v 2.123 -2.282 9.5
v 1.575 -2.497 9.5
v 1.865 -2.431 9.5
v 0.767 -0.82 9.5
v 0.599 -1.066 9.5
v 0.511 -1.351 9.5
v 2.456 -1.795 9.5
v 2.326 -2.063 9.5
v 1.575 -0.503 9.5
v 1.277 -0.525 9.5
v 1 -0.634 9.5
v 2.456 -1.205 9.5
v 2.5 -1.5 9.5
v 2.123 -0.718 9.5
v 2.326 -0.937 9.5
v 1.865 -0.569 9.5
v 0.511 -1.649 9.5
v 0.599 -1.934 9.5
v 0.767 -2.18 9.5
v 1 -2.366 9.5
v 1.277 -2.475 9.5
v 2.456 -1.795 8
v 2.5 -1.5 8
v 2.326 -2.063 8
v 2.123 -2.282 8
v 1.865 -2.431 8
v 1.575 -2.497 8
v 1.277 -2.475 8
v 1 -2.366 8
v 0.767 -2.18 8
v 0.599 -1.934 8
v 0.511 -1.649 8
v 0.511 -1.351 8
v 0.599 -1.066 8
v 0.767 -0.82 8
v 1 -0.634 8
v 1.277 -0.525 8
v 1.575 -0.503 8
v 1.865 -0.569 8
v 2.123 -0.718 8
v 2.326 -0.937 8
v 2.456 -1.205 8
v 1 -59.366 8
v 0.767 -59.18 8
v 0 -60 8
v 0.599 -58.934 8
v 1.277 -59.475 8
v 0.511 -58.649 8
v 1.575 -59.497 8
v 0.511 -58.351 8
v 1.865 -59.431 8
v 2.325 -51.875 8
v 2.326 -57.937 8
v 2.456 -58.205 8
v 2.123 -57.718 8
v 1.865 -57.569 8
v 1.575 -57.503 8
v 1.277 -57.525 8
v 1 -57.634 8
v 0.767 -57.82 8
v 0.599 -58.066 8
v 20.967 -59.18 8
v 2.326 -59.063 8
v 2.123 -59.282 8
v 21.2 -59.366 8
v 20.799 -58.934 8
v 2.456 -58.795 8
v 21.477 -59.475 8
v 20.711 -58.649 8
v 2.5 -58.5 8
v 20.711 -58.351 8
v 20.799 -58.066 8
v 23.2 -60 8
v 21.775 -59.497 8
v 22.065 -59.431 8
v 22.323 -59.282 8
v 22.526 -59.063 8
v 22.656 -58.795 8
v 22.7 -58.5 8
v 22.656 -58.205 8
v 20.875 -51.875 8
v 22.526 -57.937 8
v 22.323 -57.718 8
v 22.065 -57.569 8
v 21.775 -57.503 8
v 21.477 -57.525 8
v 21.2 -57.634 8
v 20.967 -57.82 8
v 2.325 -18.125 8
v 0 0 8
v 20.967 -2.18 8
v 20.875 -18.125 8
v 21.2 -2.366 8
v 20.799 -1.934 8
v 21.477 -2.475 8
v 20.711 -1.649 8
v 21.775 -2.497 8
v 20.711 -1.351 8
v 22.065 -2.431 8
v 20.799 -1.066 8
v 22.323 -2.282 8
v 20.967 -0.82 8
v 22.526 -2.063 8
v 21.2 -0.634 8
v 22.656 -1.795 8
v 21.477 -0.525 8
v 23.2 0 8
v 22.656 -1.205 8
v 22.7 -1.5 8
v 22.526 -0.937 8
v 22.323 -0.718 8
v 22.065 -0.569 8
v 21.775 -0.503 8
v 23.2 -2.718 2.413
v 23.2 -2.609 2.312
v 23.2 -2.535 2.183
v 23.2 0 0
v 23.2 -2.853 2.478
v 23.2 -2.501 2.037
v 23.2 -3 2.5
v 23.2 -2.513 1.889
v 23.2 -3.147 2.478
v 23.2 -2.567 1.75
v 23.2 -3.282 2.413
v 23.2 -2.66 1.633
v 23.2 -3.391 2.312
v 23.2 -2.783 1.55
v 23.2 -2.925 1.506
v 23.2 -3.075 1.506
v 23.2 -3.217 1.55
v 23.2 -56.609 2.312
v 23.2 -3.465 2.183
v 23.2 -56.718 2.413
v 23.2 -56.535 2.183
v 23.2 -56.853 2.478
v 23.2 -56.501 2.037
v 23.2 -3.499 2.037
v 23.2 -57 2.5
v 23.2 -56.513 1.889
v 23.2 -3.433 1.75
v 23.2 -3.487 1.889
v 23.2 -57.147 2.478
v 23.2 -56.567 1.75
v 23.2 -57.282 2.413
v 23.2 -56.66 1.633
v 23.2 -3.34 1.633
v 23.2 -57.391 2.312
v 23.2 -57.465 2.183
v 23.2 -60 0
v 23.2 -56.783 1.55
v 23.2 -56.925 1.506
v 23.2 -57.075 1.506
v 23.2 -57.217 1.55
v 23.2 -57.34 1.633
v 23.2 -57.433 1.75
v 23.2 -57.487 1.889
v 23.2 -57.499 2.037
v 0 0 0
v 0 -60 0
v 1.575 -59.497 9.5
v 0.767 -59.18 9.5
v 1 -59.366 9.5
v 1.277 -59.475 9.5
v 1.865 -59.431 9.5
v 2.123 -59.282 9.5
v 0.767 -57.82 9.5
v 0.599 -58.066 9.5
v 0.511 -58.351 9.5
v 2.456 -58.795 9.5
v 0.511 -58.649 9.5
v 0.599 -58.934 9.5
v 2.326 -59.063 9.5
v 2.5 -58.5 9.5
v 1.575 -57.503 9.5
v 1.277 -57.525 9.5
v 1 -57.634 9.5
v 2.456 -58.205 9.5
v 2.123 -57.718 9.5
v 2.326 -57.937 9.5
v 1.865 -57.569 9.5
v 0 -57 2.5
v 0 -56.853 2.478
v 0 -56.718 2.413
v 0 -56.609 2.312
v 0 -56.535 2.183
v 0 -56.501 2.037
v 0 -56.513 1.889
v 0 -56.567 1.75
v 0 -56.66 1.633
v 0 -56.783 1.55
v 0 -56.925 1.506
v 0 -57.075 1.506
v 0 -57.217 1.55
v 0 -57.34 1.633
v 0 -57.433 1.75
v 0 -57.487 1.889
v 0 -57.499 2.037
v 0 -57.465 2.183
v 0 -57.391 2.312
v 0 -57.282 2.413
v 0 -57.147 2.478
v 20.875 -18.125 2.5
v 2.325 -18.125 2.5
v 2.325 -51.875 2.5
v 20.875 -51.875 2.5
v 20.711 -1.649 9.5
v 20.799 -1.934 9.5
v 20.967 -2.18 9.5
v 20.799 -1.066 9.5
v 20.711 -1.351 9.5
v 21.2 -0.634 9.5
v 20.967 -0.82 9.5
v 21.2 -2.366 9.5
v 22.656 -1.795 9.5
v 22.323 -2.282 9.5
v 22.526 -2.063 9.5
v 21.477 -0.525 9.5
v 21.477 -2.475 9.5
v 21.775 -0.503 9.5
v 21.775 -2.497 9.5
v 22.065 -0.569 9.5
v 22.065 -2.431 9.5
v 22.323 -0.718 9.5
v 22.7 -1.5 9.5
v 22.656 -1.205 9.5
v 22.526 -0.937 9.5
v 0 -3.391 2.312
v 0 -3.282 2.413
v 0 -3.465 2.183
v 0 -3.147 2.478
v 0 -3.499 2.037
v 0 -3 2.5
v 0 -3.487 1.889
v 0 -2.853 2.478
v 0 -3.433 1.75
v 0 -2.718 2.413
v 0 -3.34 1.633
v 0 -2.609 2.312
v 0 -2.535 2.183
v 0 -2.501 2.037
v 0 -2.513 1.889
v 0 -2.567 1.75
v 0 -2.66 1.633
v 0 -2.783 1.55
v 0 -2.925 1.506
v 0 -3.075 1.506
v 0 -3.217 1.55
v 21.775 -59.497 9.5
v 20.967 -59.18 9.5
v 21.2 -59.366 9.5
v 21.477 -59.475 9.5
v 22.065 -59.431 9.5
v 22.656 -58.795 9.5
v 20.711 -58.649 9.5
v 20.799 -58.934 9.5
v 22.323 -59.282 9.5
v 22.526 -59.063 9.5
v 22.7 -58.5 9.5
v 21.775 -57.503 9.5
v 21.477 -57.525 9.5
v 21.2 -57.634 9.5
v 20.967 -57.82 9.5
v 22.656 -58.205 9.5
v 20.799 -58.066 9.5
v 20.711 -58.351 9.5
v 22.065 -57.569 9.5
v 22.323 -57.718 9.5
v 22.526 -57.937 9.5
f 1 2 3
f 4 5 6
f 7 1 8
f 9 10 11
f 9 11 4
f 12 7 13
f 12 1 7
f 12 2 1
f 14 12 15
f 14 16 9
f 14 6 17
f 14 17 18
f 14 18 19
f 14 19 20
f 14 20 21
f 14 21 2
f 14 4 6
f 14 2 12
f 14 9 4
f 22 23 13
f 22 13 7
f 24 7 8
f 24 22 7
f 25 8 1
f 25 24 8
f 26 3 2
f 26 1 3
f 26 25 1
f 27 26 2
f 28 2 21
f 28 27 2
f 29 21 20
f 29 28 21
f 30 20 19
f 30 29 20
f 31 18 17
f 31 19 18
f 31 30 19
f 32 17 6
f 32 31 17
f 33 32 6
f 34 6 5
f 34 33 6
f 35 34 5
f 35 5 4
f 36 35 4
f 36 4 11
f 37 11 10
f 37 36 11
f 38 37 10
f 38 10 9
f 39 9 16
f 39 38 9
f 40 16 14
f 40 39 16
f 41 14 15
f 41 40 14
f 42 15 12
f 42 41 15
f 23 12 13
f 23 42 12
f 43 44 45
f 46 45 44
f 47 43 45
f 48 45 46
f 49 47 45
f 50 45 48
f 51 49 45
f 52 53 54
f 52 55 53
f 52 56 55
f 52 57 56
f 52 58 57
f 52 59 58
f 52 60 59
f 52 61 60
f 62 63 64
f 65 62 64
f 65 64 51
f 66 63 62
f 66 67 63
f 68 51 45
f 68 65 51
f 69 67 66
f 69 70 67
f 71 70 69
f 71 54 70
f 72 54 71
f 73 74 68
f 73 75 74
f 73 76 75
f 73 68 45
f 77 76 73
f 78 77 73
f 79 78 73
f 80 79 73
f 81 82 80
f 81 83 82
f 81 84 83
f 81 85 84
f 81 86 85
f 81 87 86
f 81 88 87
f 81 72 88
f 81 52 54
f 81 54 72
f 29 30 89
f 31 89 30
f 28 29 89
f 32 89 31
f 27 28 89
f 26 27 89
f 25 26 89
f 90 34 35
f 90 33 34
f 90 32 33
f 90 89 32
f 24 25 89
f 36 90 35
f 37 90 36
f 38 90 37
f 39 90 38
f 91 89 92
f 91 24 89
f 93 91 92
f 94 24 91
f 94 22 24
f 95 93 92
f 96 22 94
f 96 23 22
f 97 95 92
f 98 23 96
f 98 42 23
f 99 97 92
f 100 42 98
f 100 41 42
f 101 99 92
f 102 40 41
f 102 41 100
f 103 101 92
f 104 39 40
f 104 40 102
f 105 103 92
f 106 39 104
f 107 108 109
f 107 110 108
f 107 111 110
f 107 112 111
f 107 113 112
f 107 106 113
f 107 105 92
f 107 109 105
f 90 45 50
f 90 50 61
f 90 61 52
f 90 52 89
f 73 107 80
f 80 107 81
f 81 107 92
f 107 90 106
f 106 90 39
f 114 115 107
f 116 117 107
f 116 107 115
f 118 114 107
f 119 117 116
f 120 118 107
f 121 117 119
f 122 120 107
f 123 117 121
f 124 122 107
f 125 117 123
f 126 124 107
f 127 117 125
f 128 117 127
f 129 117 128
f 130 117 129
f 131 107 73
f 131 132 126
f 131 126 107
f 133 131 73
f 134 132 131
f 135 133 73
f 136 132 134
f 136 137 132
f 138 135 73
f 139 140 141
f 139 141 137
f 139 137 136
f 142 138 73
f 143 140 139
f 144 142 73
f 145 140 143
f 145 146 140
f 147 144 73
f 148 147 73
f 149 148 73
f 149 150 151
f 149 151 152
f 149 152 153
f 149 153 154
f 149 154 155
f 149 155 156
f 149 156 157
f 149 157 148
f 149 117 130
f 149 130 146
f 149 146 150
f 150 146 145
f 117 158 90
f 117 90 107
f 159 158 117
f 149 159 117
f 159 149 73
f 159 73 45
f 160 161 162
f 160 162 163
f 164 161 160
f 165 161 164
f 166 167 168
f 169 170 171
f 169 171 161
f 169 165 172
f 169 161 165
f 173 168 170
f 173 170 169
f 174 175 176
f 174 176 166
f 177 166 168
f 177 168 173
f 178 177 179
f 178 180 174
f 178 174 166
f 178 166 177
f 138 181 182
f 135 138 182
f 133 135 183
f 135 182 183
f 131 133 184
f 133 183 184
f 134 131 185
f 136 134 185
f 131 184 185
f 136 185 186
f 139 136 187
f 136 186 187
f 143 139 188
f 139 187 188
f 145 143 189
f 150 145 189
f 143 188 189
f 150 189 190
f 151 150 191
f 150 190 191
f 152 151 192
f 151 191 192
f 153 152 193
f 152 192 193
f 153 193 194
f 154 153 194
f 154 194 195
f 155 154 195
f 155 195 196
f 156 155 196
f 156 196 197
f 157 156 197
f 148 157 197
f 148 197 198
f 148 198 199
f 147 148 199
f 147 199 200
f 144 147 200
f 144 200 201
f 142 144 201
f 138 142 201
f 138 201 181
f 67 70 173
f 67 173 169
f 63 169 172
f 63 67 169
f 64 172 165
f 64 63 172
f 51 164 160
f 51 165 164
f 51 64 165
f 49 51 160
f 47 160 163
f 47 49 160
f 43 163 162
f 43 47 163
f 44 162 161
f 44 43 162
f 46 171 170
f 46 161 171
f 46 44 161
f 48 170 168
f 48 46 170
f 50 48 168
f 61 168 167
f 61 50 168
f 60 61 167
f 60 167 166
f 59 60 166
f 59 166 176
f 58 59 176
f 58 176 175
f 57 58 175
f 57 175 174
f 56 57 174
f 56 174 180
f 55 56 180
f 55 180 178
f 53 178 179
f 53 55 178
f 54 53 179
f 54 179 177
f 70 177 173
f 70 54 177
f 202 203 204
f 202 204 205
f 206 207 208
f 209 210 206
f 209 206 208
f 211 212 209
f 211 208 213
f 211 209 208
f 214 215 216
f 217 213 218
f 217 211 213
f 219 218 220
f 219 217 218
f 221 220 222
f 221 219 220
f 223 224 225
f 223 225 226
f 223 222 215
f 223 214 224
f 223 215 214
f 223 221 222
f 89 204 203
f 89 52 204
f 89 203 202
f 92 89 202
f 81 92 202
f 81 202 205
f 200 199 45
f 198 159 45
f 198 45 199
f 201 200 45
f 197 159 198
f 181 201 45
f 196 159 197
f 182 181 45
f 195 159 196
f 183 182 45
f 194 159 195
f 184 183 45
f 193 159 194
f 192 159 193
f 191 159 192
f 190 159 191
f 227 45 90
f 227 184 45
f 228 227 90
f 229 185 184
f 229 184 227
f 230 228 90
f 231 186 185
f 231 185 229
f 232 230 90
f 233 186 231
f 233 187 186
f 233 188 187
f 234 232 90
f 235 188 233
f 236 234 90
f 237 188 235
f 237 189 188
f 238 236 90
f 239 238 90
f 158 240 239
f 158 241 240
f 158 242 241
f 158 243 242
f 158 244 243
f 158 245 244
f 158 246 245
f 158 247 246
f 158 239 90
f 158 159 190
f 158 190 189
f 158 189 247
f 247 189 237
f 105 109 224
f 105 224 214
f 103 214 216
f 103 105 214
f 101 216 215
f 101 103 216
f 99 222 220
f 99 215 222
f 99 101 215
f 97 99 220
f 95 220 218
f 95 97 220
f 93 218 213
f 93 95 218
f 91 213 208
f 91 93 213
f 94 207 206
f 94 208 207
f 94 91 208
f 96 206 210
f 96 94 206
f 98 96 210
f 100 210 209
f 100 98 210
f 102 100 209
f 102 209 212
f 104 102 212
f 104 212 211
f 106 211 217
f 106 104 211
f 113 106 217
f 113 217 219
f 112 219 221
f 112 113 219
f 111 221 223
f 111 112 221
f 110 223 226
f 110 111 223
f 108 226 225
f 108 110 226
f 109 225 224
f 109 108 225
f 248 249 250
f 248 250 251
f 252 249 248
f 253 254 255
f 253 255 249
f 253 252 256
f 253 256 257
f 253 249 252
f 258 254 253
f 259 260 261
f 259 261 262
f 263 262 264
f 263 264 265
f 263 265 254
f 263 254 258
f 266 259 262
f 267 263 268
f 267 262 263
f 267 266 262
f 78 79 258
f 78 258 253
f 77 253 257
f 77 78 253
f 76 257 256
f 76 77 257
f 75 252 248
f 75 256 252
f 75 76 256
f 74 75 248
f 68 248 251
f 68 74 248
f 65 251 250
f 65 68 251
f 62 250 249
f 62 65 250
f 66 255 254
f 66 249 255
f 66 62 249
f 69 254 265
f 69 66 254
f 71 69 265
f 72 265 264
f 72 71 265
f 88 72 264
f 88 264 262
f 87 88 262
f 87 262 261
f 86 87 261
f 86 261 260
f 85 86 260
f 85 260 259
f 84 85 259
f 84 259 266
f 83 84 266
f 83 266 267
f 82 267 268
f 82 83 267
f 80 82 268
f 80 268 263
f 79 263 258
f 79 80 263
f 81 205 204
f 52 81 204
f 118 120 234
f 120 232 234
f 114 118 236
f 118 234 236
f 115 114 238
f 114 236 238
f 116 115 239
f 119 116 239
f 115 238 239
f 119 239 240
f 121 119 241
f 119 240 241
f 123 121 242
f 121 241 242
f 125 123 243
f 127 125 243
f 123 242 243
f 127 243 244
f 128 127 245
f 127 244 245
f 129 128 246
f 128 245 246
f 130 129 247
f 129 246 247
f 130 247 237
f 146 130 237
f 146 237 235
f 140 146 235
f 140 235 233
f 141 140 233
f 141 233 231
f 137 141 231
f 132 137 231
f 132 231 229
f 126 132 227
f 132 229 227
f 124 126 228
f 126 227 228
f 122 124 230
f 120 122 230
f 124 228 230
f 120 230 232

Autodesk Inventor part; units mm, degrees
ref_plane "YZ Plane" through (0, 0, 0) normal (1, 0, 0) x (0, 1, 0)
ref_plane "XZ Plane" through (0, 0, 0) normal (0, 1, 0) x (-1, 0, 0)
ref_plane "XY Plane" through (0, 0, 0) normal (0, 0, 1) x (1, 0, 0)
sketch "Sketch1" plane through (0, 0, 0) normal (0, 0, 1) x (1, 0, 0)
  line L0 (0, 0) -> (23.2, 0)
  line L1 (23.2, 0) -> (23.2, -60)
  line L2 (23.2, -60) -> (0, -60)
  line L3 (0, -60) -> (0, 0)
  dimension "d0" = 23.2
  dimension "d1" = 60
extrude "Extrusion1" add sketch "Sketch1" along normal blind 8
sketch "Sketch2" plane through (0, 0, 8) normal (0, 0, 1) x (1, 0, 0)
  line L0 (23.2, 0) -> (0, 0) projected
  line L1 (2.325, -3) -> (20.875, -3)
  line L2 (20.875, -3) -> (20.875, -57)
  line L3 (20.875, -57) -> (2.325, -57)
  line L4 (2.325, -57) -> (2.325, -3)
  line L5 (0, 0) -> (23.2, 0)
  line L6 (23.2, 0) -> (23.2, -60)
  line L7 (23.2, -60) -> (0, -60)
  line L8 (0, -60) -> (0, 0)
  dimension "d8" = 3
  dimension "d9" = 3
  dimension "d10" = 2.325
  dimension "d11" = 2.325
extrude "Extrusion2" cut sketch "Sketch2" against normal blind 5.5 contours L1 L2 L3 L4
sketch "Sketch3" plane through (0, -60, 0) normal (-1, 0, 0) x (0, 0, 1)
  circle A0 centre (2, 57) radius 0.5
  line L0 (0, 60) -> (8, 60) projected
  line L1 (0, 60) -> (0, 0) projected
  circle A1 centre (2, 3) radius 0.5
  line L2 (0, 0) -> (8, 0) projected
  dimension "d16" = 1
  dimension "d17" = 3
  dimension "d21" = 1
  dimension "d22" = 2
  dimension "d23" = 3
  dimension "d24" = 2
extrude "Extrusion3" cut sketch "Sketch3" against normal blind 25
sketch "Sketch4" plane through (0, 0, 8) normal (0, 0, 1) x (1, 0, 0)
  line L0 (2.325, -57) -> (2.325, -3) projected
  circle A0 centre (1.5, -1.5) radius 1
  line L1 (20.875, -57) -> (2.325, -57) projected
  line L2 (20.875, -3) -> (20.875, -57) projected
  line L3 (2.325, -3) -> (20.875, -3) projected
  line L4 (20.875, -3) -> (20.875, -4.1486)
  circle A1 centre (21.7, -1.5) radius 1
  circle A2 centre (21.7, -58.5) radius 1
  circle A3 centre (1.5, -58.5) radius 1
  line L5 (0, -60) -> (23.2, -60) projected
  line L6 (23.2, -60) -> (23.2, 0) projected
  line L7 (23.2, 0) -> (0, 0) projected
  line L8 (0, 0) -> (0, -60) projected
  dimension "d27" = 2
  dimension "d29" = 2
  dimension "d31" = 2
  dimension "d32" = 2
  dimension "d34" = 1.5
  dimension "d35" = 1.5
  dimension "d36" = 1.5
  dimension "d37" = 1.5
  dimension "d38" = 1.5
  dimension "d39" = 1.5
  dimension "d40" = 1.5
  dimension "d41" = 1.5
extrude "Extrusion4" add sketch "Sketch4" along normal blind 1.5 contours A0 | A1 | A2 | A3
sketch "Sketch6" plane through (0, 0, 2.5) normal (0, 0, 1) x (1, 0, 0)
  line L0 (2.325, -3) -> (20.875, -3) projected
  line L1 (20.875, -57) -> (2.325, -57) projected
  line L2 (2.325, -18.125) -> (20.875, -18.125)
  line L3 (20.875, -51.875) -> (2.325, -51.875)
  line L4 (2.325, -51.875) -> (2.325, -18.125)
  line L5 (23.2, -60) -> (23.2, 0) projected
  line L6 (20.875, -18.125) -> (20.875, -51.875)
  line L7 (2.325, -57) -> (2.325, -3) projected
  line L8 (2.325, -3) -> (20.875, -3)
  line L9 (20.875, -3) -> (20.875, -18.125)
  line L10 (20.875, -18.125) -> (2.325, -18.125)
  line L11 (2.325, -18.125) -> (2.325, -3)
  line L12 (2.325, -51.875) -> (20.875, -51.875)
  line L13 (20.875, -51.875) -> (20.875, -57)
  line L14 (20.875, -57) -> (2.325, -57)
  line L15 (2.325, -57) -> (2.325, -51.875)
  point P0 (0, 0)
  dimension "d46" = 15.125
  dimension "d47" = 5.125
  dimension "d49" = 20.875
extrude "Extrusion5" add sketch "Sketch6" along normal blind 5.5 contours L0 L9 L2 L7 | L3 L13 L1 L7
properties part number "BaseBluetooth"
